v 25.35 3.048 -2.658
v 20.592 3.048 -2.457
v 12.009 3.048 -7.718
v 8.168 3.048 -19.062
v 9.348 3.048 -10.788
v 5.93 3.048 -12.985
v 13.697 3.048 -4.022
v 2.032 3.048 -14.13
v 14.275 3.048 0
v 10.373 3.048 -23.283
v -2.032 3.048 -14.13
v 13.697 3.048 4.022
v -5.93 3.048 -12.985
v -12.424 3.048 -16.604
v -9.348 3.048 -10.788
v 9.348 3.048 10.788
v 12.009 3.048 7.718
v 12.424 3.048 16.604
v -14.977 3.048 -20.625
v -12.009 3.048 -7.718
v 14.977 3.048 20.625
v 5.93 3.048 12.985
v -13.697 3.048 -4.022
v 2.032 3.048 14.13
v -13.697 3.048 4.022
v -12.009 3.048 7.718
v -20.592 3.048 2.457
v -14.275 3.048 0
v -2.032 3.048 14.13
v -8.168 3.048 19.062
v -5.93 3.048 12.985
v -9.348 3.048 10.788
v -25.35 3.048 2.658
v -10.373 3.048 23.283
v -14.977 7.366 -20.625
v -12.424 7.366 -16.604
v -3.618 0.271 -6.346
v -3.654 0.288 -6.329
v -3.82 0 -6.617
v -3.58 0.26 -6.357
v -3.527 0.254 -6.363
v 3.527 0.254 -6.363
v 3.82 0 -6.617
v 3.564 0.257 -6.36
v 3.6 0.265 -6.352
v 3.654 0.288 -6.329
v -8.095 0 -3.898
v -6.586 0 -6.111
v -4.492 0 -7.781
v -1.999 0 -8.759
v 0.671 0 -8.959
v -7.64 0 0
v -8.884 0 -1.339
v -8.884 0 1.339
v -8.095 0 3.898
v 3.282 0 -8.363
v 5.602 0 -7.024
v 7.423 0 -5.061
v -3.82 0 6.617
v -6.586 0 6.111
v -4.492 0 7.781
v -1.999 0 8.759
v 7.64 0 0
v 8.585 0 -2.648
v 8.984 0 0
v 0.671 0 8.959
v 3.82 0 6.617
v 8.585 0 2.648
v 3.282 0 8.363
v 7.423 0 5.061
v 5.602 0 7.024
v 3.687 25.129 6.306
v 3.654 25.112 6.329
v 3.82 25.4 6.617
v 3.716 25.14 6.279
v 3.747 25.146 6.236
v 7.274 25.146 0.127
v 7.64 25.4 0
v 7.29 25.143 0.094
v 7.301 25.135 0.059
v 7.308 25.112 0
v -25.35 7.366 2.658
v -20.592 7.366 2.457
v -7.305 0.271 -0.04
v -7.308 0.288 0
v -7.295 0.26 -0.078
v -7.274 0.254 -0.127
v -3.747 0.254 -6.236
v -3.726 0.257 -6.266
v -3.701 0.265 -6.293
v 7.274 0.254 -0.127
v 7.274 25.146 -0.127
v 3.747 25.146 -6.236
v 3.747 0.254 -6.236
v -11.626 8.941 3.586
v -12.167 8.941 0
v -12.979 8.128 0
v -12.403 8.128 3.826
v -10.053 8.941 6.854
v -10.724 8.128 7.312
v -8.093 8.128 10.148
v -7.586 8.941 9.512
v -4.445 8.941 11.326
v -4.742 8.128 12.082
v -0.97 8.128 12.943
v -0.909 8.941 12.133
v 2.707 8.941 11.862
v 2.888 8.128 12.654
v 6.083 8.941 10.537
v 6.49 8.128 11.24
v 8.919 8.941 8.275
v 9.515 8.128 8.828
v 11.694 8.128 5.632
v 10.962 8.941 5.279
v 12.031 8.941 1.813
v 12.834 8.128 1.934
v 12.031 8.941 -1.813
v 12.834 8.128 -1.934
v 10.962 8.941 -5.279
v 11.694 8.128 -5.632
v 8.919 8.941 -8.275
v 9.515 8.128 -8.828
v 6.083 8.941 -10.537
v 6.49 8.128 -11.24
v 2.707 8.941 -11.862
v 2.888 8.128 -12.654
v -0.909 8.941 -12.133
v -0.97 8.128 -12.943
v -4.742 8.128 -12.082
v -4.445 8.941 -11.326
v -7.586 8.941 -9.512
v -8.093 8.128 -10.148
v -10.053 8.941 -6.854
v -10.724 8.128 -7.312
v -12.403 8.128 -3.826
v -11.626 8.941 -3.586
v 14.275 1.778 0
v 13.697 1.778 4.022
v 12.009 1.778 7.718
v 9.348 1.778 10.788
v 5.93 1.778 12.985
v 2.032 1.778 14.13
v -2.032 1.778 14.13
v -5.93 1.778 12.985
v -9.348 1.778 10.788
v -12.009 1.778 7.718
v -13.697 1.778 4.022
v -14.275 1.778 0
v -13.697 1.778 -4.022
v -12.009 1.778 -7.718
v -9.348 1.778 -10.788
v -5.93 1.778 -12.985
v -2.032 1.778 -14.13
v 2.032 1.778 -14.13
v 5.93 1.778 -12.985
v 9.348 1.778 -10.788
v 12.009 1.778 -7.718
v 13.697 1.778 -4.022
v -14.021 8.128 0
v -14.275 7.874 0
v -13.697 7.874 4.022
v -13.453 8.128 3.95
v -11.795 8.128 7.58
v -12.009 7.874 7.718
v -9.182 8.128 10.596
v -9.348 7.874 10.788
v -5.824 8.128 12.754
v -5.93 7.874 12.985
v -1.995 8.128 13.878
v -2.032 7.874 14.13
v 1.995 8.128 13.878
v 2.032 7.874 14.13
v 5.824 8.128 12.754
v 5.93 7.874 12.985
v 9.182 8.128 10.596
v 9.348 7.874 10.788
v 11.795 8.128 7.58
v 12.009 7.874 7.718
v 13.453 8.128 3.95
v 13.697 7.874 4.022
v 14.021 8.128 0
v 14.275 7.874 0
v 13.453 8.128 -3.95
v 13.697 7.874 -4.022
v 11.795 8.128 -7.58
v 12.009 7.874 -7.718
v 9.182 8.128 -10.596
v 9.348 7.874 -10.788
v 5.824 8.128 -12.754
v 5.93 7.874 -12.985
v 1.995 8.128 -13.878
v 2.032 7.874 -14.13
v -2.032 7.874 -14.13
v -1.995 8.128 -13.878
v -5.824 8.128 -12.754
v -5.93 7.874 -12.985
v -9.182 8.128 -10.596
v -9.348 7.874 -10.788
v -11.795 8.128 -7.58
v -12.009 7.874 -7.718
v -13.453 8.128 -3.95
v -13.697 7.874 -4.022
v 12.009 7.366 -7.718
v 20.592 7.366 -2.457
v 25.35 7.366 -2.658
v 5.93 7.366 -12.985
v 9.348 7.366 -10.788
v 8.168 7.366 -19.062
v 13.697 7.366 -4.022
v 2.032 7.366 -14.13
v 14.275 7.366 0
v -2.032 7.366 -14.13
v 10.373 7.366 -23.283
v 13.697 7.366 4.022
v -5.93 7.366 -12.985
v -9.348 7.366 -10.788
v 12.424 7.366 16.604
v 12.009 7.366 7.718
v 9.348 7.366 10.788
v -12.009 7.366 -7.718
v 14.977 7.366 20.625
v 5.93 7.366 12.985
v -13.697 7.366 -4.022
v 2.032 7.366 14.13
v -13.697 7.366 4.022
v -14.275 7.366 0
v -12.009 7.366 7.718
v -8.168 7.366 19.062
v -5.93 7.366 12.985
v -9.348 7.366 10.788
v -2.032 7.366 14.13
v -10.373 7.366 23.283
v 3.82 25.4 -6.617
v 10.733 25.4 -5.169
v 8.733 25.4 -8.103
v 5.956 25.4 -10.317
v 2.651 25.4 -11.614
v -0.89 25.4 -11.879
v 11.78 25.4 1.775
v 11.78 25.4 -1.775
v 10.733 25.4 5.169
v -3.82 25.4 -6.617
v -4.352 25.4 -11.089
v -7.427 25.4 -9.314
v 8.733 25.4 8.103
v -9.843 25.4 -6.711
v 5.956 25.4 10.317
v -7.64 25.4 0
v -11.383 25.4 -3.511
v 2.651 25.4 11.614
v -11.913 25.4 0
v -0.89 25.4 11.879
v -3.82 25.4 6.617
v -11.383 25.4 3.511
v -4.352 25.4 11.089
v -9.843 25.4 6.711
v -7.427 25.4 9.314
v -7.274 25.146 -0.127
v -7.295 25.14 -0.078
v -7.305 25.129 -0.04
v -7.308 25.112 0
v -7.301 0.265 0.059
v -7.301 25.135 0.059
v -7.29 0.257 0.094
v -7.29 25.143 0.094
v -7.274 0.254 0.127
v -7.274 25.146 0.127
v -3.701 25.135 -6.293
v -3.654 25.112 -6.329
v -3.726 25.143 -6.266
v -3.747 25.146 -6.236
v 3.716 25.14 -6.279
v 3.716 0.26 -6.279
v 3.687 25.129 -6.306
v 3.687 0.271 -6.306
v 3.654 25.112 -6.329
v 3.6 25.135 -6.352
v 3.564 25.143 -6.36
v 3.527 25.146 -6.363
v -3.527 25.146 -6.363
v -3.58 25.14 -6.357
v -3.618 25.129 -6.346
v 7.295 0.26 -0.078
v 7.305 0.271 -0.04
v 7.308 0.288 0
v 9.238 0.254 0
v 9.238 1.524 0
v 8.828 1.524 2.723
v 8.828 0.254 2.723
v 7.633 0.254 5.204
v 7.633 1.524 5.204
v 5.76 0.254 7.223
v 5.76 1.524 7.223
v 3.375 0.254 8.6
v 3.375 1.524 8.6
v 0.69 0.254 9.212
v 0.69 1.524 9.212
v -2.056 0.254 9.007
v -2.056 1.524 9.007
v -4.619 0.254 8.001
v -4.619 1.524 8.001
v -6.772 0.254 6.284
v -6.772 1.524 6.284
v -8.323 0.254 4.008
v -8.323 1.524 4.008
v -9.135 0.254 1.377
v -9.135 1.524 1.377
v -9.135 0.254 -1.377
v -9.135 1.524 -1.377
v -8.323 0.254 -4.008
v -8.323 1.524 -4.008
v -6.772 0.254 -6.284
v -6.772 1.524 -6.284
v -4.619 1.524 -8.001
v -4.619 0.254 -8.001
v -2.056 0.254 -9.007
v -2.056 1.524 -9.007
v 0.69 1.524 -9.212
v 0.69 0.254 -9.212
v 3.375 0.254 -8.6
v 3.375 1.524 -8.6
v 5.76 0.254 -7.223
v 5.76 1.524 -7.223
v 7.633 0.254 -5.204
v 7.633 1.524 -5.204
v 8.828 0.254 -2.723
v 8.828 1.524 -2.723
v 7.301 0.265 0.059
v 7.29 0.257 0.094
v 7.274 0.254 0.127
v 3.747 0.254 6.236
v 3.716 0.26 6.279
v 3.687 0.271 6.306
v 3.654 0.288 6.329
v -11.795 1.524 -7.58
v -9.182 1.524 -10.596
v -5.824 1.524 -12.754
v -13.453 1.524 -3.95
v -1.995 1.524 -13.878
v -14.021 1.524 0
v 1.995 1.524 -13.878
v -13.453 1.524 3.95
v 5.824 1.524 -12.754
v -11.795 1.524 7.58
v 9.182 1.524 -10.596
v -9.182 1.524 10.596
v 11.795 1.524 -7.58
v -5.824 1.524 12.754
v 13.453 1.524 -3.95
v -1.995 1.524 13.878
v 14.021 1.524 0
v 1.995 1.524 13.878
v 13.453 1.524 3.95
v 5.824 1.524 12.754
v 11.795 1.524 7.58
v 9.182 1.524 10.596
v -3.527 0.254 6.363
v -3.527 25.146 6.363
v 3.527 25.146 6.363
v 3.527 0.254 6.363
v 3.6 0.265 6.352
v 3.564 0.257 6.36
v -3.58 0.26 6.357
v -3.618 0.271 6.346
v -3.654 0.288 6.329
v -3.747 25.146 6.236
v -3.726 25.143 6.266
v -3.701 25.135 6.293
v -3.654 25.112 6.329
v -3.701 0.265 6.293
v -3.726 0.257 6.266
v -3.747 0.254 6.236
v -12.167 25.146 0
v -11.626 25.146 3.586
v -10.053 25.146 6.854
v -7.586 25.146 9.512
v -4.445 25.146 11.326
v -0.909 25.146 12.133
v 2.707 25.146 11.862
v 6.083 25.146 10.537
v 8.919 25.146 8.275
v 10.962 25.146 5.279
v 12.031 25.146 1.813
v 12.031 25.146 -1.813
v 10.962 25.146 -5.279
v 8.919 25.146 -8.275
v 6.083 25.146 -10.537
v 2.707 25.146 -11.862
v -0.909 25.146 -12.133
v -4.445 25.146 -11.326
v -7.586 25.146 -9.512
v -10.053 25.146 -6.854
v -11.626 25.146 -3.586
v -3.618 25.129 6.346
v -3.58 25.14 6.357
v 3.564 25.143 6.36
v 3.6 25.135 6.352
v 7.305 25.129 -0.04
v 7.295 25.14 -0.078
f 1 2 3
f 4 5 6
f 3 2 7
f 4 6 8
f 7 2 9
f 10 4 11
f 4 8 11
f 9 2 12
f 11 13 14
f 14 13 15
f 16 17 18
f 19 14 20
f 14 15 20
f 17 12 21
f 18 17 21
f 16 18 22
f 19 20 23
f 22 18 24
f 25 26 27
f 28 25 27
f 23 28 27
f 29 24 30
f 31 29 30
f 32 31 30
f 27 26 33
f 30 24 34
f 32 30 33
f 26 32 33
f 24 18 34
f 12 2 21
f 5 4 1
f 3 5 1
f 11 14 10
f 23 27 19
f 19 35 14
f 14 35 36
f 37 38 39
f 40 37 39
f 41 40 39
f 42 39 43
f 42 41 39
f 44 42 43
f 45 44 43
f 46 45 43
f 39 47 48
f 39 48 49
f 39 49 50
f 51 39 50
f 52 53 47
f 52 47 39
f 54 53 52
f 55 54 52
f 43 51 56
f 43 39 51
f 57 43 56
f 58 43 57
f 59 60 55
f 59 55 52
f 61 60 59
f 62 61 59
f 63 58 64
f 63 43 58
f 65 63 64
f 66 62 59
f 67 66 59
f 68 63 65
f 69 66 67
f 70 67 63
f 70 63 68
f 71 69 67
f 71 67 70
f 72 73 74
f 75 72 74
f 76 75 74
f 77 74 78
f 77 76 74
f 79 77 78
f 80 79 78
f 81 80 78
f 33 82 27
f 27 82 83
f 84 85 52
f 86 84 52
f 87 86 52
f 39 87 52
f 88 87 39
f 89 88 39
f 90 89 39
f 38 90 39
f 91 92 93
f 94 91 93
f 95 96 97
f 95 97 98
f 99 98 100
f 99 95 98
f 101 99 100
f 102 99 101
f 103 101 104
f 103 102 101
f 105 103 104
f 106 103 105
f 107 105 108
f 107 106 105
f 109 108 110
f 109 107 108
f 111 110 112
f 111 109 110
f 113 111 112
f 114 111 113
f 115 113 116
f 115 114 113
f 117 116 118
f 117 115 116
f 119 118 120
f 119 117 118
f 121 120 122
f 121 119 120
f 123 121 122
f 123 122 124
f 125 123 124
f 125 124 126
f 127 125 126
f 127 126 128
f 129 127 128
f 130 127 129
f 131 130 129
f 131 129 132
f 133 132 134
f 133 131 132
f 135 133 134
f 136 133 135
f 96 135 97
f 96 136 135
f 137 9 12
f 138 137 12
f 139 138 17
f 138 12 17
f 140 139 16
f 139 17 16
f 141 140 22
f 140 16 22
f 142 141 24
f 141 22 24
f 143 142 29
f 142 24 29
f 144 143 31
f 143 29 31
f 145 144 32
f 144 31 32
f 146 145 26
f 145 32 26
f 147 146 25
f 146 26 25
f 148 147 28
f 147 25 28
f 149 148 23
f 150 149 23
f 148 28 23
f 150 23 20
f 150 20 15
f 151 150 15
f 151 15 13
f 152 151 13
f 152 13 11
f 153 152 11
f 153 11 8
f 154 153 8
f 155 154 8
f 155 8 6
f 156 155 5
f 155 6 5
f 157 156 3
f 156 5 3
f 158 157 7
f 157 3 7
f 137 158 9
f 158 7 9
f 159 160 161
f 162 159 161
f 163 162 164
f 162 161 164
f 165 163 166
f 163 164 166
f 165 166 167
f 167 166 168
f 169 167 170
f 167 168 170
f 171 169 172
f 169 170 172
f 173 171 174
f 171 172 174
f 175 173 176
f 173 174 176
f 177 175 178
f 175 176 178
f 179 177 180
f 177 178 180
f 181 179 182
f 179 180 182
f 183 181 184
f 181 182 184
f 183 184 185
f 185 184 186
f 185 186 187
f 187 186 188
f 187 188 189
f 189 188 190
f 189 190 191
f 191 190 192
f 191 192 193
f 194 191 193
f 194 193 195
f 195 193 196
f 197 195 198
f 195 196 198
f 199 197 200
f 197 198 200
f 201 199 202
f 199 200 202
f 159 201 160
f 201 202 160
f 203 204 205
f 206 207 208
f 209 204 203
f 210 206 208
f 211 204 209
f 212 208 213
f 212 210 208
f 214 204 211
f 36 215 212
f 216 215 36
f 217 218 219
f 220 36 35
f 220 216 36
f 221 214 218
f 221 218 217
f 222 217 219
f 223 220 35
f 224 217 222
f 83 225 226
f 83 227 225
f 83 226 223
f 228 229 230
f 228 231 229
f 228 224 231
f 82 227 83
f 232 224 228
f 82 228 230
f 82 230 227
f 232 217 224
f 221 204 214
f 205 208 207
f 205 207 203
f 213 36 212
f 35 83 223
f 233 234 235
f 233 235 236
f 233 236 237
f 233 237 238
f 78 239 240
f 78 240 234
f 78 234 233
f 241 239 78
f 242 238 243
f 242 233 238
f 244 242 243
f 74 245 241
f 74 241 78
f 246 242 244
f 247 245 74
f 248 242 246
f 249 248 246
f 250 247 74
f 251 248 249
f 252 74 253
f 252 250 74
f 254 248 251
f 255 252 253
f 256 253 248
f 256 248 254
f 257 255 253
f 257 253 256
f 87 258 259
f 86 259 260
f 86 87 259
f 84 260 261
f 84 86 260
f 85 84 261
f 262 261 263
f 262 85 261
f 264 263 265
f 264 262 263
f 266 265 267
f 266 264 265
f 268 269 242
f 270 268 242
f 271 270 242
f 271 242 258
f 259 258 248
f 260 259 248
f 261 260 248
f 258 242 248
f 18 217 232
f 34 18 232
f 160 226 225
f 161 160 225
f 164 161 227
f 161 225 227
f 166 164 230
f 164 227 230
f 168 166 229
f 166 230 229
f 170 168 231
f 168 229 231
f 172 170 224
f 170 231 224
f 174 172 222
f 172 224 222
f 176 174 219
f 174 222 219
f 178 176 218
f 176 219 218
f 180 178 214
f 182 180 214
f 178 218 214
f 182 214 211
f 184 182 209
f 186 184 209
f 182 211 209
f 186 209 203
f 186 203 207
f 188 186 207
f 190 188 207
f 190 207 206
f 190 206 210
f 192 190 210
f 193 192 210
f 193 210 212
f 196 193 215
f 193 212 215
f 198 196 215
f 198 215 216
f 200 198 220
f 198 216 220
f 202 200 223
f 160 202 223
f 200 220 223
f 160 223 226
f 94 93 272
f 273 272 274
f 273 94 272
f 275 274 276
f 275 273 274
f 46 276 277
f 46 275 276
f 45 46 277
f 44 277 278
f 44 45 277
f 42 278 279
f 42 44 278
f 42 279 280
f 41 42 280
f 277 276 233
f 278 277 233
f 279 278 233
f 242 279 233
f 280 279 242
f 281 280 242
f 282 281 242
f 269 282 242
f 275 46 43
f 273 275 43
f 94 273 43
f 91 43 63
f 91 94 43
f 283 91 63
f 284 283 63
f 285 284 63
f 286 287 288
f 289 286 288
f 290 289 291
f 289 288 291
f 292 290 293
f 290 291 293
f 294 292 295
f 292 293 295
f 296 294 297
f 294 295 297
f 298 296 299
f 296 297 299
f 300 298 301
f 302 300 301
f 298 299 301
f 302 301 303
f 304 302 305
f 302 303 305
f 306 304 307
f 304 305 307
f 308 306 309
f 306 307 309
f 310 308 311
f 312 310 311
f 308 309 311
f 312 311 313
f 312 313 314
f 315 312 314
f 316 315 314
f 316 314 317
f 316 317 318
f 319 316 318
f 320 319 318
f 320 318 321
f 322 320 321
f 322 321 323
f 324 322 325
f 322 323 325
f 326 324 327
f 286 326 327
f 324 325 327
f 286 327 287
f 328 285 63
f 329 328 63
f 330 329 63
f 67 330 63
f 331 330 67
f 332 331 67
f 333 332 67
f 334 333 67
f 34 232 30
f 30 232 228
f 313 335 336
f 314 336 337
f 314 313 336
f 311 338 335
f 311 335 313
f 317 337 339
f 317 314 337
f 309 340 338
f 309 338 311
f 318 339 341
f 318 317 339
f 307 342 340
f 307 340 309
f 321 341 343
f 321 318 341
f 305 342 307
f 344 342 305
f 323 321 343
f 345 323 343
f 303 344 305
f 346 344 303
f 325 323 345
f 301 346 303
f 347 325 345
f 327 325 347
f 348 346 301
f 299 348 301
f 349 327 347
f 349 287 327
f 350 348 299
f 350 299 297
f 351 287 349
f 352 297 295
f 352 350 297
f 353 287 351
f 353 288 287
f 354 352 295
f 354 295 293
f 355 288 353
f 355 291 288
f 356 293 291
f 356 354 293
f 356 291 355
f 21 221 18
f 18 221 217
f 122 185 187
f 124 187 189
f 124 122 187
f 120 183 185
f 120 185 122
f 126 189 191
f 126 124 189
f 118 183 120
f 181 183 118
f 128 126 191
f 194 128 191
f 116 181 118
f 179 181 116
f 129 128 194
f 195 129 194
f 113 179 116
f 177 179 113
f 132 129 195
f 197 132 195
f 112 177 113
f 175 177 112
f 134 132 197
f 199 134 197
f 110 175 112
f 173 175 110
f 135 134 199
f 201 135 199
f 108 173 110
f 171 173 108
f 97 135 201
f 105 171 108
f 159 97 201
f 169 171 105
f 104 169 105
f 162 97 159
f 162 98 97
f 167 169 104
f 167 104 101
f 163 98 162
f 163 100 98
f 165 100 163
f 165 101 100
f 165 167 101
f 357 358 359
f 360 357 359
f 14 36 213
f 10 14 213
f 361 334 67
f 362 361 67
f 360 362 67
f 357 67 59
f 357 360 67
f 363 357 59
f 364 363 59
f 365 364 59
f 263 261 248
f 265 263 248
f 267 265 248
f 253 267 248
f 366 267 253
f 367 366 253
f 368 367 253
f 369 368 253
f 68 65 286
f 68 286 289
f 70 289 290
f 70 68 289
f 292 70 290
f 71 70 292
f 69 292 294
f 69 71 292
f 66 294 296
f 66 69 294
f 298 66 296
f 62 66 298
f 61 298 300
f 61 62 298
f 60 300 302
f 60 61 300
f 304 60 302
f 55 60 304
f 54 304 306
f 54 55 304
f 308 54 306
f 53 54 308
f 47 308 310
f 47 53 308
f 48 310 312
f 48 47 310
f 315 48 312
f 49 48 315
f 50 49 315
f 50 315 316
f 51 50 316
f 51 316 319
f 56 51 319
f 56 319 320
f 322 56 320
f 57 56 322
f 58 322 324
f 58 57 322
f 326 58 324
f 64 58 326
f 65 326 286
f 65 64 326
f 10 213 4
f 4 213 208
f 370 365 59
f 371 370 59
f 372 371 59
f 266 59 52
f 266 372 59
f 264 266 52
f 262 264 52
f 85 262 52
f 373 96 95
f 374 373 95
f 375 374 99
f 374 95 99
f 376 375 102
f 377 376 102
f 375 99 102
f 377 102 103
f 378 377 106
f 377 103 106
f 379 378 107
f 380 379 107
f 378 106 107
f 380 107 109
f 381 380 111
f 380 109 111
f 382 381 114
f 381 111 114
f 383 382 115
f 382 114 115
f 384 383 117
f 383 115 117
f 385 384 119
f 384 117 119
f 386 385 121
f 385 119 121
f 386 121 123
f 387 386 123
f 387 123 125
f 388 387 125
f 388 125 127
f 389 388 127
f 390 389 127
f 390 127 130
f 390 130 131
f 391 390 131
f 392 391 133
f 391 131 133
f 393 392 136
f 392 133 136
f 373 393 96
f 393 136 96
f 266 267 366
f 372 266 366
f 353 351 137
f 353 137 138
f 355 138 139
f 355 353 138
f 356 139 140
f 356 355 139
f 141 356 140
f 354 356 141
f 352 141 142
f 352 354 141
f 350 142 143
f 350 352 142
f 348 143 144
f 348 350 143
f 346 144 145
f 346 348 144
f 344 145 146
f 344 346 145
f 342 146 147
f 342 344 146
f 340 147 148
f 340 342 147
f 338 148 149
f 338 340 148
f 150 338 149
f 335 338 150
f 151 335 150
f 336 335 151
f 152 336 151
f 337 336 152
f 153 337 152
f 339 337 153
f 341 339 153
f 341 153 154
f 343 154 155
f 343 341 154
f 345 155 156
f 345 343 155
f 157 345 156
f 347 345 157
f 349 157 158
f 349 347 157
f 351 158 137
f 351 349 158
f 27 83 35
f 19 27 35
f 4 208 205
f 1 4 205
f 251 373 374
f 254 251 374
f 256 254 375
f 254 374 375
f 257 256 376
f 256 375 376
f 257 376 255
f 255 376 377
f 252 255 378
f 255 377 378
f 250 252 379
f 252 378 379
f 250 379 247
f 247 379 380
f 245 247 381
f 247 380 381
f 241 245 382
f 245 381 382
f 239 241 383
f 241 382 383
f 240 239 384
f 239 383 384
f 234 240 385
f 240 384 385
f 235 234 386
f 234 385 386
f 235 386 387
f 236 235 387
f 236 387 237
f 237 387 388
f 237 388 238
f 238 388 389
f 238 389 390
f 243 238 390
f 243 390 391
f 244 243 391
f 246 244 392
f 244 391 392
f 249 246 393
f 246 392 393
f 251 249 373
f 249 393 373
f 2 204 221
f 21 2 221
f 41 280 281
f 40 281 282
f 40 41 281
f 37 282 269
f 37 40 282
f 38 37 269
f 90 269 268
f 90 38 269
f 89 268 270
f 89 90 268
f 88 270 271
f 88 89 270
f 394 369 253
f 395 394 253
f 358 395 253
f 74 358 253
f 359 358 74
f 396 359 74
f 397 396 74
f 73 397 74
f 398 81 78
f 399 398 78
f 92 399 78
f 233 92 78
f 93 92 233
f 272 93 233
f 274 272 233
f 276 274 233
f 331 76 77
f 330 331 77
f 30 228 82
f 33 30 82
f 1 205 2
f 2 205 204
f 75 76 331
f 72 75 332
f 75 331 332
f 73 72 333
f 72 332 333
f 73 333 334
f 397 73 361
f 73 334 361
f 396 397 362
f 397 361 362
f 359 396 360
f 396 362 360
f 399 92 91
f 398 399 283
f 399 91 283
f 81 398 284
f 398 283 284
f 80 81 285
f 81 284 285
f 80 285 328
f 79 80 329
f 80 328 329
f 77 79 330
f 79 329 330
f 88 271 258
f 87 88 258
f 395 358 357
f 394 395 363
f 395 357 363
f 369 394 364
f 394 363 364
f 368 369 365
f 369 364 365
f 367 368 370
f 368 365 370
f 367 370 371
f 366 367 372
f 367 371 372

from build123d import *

# Parameters (mm, degrees)
SKETCH1_W           = 27.7876
SKETCH1_H           = 4.318
CUT_EXTRUDE1_DEPTH  = 5.318
CUT_EXTRUDE2_DEPTH  = 5.318
CUT_EXTRUDE3_DEPTH  = 5.318
CUT_EXTRUDE4_DEPTH  = 5.318
CUT_EXTRUDE5_DEPTH  = 5.318
CUT_EXTRUDE6_DEPTH  = 5.318
CUT_EXTRUDE7_DEPTH  = 5.318
CUT_EXTRUDE8_DEPTH  = 5.318
CUT_EXTRUDE9_DEPTH  = 5.318
CUT_EXTRUDE10_DEPTH = 5.318
CUT_EXTRUDE11_DEPTH = 5.318
CUT_EXTRUDE12_DEPTH = 5.318
SKETCH14_R          = 14.2748
BOSS_EXTRUDE1_DEPTH = 1.524
SKETCH15_R          = 9.23823544
BOSS_EXTRUDE2_DEPTH = 1.524
SKETCH16_R          = 14.2748
BOSS_EXTRUDE3_DEPTH = 0.762
SKETCH17_R          = 12.1666
BOSS_EXTRUDE4_DEPTH = 17.272
CUT_EXTRUDE13_DEPTH = 26.4
SKETCH19_W          = 2.5908
SKETCH19_H          = 4.318
SKETCH20_W          = 2.5908
SKETCH20_H          = 4.318
SKETCH21_W          = 2.5908
SKETCH21_H          = 4.318
SKETCH22_W          = 2.5908
SKETCH22_H          = 4.318
SKETCH23_W          = 2.5908
SKETCH23_H          = 4.318
SKETCH24_W          = 2.5908
SKETCH24_H          = 4.318
CHAMFER1_SIZE       = 0.254
CHAMFER2_SIZE       = 0.8128
FILLET1_R           = 0.254
FILLET2_R           = 0.7874
FILLET3_R           = 1.27
SKETCH25_R          = 28.050561638
SKETCH25_R_2        = 25.4889
CUT_EXTRUDE14_DEPTH = 8.366
CUT_EXTRUDE15_DEPTH = 8.366


with BuildPart() as part:
    # Sketch1 → Revolve1 (revolve)
    with BuildSketch(Plane.XY):
        with Locations((13.8938, 5.207)):
            Rectangle(SKETCH1_W, SKETCH1_H)
    revolve(axis=Axis((0, 7.366, 0), (0, -1, 0)))

    # Sketch2 → Cut-Extrude1 (cut, through all)
    with BuildSketch(Plane(origin=(0, 7.366, 0), x_dir=(-1, 0, 0), z_dir=(0, 1, 0))):
        with BuildLine():
            Line((27.742216161, 1.5875), (25.859959008, 1.5875))
            ThreePointArc((25.859959008, 1.5875), (26.4033, 0), (25.859959008, -1.5875))
            Line((25.859959008, -1.5875), (27.742216161, -1.5875))
            ThreePointArc((27.742216161, -1.5875), (27.7876, 0), (27.742216161, 1.5875))
        make_face()
    extrude(amount=-CUT_EXTRUDE1_DEPTH, mode=Mode.SUBTRACT)

    # Sketch3 → Cut-Extrude2 (cut, through all)
    with BuildSketch(Plane(origin=(0, 7.366, 0), x_dir=(-1, 0, 0), z_dir=(0, 1, 0))):
        with BuildLine():
            ThreePointArc((27.521980347, -3.832924674), (26.332306318, -4.701290474), (24.95050128, -5.211190755))
            ThreePointArc((24.95050128, -5.211190755), (22.074034915, -12.74445), (16.988274218, -19.002172568))
            ThreePointArc((16.988274218, -19.002172568), (17.23759014, -20.453800974), (17.080400312, -21.918271806))
            ThreePointArc((17.080400312, -21.918271806), (24.06476751, -13.8938), (27.521980347, -3.832924674))
        make_face()
    extrude(amount=-CUT_EXTRUDE2_DEPTH, mode=Mode.SUBTRACT)

    # Sketch4 → Cut-Extrude3 (cut, through all)
    with BuildSketch(Plane(origin=(0, 7.366, 0), x_dir=(-1, 0, 0), z_dir=(0, 1, 0))):
        with BuildLine():
            Line((15.245923409, -23.231713952), (14.304794833, -21.601631442))
            ThreePointArc((14.304794833, -21.601631442), (13.20165, -22.865928544), (11.555164176, -23.189131442))
            Line((11.555164176, -23.189131442), (12.496292752, -24.819213952))
            ThreePointArc((12.496292752, -24.819213952), (13.8938, -24.06476751), (15.245923409, -23.231713952))
        make_face()
    extrude(amount=-CUT_EXTRUDE3_DEPTH, mode=Mode.SUBTRACT)

    # Sketch5 → Cut-Extrude4 (cut, through all)
    with BuildSketch(Plane(origin=(0, 7.366, 0), x_dir=(-1, 0, 0), z_dir=(0, 1, 0))):
        with BuildLine():
            ThreePointArc((10.441580035, -25.75119648), (9.094716178, -25.155091448), (7.962227062, -24.213363323))
            ThreePointArc((7.962227062, -24.213363323), (0, -25.4889), (-7.962227062, -24.213363323))
            ThreePointArc((-7.962227062, -24.213363323), (-9.094716178, -25.155091448), (-10.441580035, -25.75119648))
            ThreePointArc((-10.441580035, -25.75119648), (0, -27.7876), (10.441580035, -25.75119648))
        make_face()
    extrude(amount=-CUT_EXTRUDE4_DEPTH, mode=Mode.SUBTRACT)

    # Sketch6 → Cut-Extrude5 (cut, through all)
    with BuildSketch(Plane(origin=(0, 7.366, 0), x_dir=(-1, 0, 0), z_dir=(0, 1, 0))):
        with BuildLine():
            Line((-12.496292752, -24.819213952), (-11.555164176, -23.189131442))
            ThreePointArc((-11.555164176, -23.189131442), (-13.20165, -22.865928544), (-14.304794833, -21.601631442))
            Line((-14.304794833, -21.601631442), (-15.245923409, -23.231713952))
            ThreePointArc((-15.245923409, -23.231713952), (-13.8938, -24.06476751), (-12.496292752, -24.819213952))
        make_face()
    extrude(amount=-CUT_EXTRUDE5_DEPTH, mode=Mode.SUBTRACT)

    # Sketch7 → Cut-Extrude6 (cut, through all)
    with BuildSketch(Plane(origin=(0, 7.366, 0), x_dir=(-1, 0, 0), z_dir=(0, 1, 0))):
        with BuildLine():
            ThreePointArc((-17.080400312, -21.918271806), (-17.23759014, -20.453800974), (-16.988274218, -19.002172568))
            ThreePointArc((-16.988274218, -19.002172568), (-22.074034915, -12.74445), (-24.95050128, -5.211190755))
            ThreePointArc((-24.95050128, -5.211190755), (-26.332306318, -4.701290474), (-27.521980347, -3.832924674))
            ThreePointArc((-27.521980347, -3.832924674), (-24.06476751, -13.8938), (-17.080400312, -21.918271806))
        make_face()
    extrude(amount=-CUT_EXTRUDE6_DEPTH, mode=Mode.SUBTRACT)

    # Sketch8 → Cut-Extrude7 (cut, through all)
    with BuildSketch(Plane(origin=(0, 7.366, 0), x_dir=(-1, 0, 0), z_dir=(0, 1, 0))):
        with BuildLine():
            Line((-27.742216161, -1.5875), (-25.859959008, -1.5875))
            ThreePointArc((-25.859959008, -1.5875), (-26.4033, 0), (-25.859959008, 1.5875))
            Line((-25.859959008, 1.5875), (-27.742216161, 1.5875))
            ThreePointArc((-27.742216161, 1.5875), (-27.7876, 0), (-27.742216161, -1.5875))
        make_face()
    extrude(amount=-CUT_EXTRUDE7_DEPTH, mode=Mode.SUBTRACT)

    # Sketch9 → Cut-Extrude8 (cut, through all)
    with BuildSketch(Plane(origin=(0, 7.366, 0), x_dir=(-1, 0, 0), z_dir=(0, 1, 0))):
        with BuildLine():
            ThreePointArc((-27.521980347, 3.832924674), (-26.332306318, 4.701290474), (-24.95050128, 5.211190755))
            ThreePointArc((-24.95050128, 5.211190755), (-22.074034915, 12.74445), (-16.988274218, 19.002172568))
            ThreePointArc((-16.988274218, 19.002172568), (-17.23759014, 20.453800974), (-17.080400312, 21.918271806))
            ThreePointArc((-17.080400312, 21.918271806), (-24.06476751, 13.8938), (-27.521980347, 3.832924674))
        make_face()
    extrude(amount=-CUT_EXTRUDE8_DEPTH, mode=Mode.SUBTRACT)

    # Sketch10 → Cut-Extrude9 (cut, through all)
    with BuildSketch(Plane(origin=(0, 7.366, 0), x_dir=(-1, 0, 0), z_dir=(0, 1, 0))):
        with BuildLine():
            Line((-15.245923409, 23.231713952), (-14.304794833, 21.601631442))
            ThreePointArc((-14.304794833, 21.601631442), (-13.20165, 22.865928544), (-11.555164176, 23.189131442))
            Line((-11.555164176, 23.189131442), (-12.496292752, 24.819213952))
            ThreePointArc((-12.496292752, 24.819213952), (-13.8938, 24.06476751), (-15.245923409, 23.231713952))
        make_face()
    extrude(amount=-CUT_EXTRUDE9_DEPTH, mode=Mode.SUBTRACT)

    # Sketch11 → Cut-Extrude10 (cut, through all)
    with BuildSketch(Plane(origin=(0, 7.366, 0), x_dir=(-1, 0, 0), z_dir=(0, 1, 0))):
        with BuildLine():
            ThreePointArc((-10.441580035, 25.75119648), (-9.094716178, 25.155091448), (-7.962227062, 24.213363323))
            ThreePointArc((-7.962227062, 24.213363323), (0, 25.4889), (7.962227062, 24.213363323))
            ThreePointArc((7.962227062, 24.213363323), (9.094716178, 25.155091448), (10.441580035, 25.75119648))
            ThreePointArc((10.441580035, 25.75119648), (0, 27.7876), (-10.441580035, 25.75119648))
        make_face()
    extrude(amount=-CUT_EXTRUDE10_DEPTH, mode=Mode.SUBTRACT)

    # Sketch12 → Cut-Extrude11 (cut, through all)
    with BuildSketch(Plane(origin=(0, 7.366, 0), x_dir=(-1, 0, 0), z_dir=(0, 1, 0))):
        with BuildLine():
            Line((12.496292752, 24.819213952), (11.555164176, 23.189131442))
            ThreePointArc((11.555164176, 23.189131442), (13.20165, 22.865928544), (14.304794833, 21.601631442))
            Line((14.304794833, 21.601631442), (15.245923409, 23.231713952))
            ThreePointArc((15.245923409, 23.231713952), (13.8938, 24.06476751), (12.496292752, 24.819213952))
        make_face()
    extrude(amount=-CUT_EXTRUDE11_DEPTH, mode=Mode.SUBTRACT)

    # Sketch13 → Cut-Extrude12 (cut, through all)
    with BuildSketch(Plane(origin=(0, 7.366, 0), x_dir=(-1, 0, 0), z_dir=(0, 1, 0))):
        with BuildLine():
            ThreePointArc((17.080400312, 21.918271806), (17.23759014, 20.453800974), (16.988274218, 19.002172568))
            ThreePointArc((16.988274218, 19.002172568), (22.074034915, 12.74445), (24.95050128, 5.211190755))
            ThreePointArc((24.95050128, 5.211190755), (26.332306318, 4.701290474), (27.521980347, 3.832924674))
            ThreePointArc((27.521980347, 3.832924674), (24.06476751, 13.8938), (17.080400312, 21.918271806))
        make_face()
    extrude(amount=-CUT_EXTRUDE12_DEPTH, mode=Mode.SUBTRACT)

    # Sketch14 → Boss-Extrude1 (add)
    with BuildSketch(Plane.XZ.offset(-3.048)):
        Circle(SKETCH14_R)
    extrude(amount=BOSS_EXTRUDE1_DEPTH)

    # Sketch15 → Boss-Extrude2 (add)
    with BuildSketch(Plane.XZ.offset(-1.524)):
        Circle(SKETCH15_R)
    extrude(amount=BOSS_EXTRUDE2_DEPTH)

    # Sketch16 → Boss-Extrude3 (add)
    with BuildSketch(Plane(origin=(0, 7.366, 0), x_dir=(-1, 0, 0), z_dir=(0, 1, 0))):
        Circle(SKETCH16_R)
    extrude(amount=BOSS_EXTRUDE3_DEPTH)

    # Sketch17 → Boss-Extrude4 (add)
    with BuildSketch(Plane(origin=(0, 8.128, 0), x_dir=(-1, 0, 0), z_dir=(0, 1, 0))):
        Circle(SKETCH17_R)
    extrude(amount=BOSS_EXTRUDE4_DEPTH)

    # Sketch18 → Cut-Extrude13 (cut, through all)
    with BuildSketch(Plane(origin=(0, 25.4, 0), x_dir=(-1, 0, 0), z_dir=(0, 1, 0))):
        Polygon((-3.673506558, -6.3627), (3.673506558, -6.3627), (7.347013116, 0), (3.673506558, 6.3627), (-3.673506558, 6.3627), (-7.347013116, 0), align=None)
    extrude(amount=-CUT_EXTRUDE13_DEPTH, mode=Mode.SUBTRACT)

    # Sketch19 → Cut-Revolve1 (revolve, cut)
    with BuildSketch(Plane(origin=(0, 0, 0), x_dir=(-1, 0, 0), z_dir=(0, 0, -1))):
        with Locations((22.5171, 5.207)):
            Rectangle(SKETCH19_W, SKETCH19_H)
    revolve(axis=Axis((-23.8125, 3.048, 0), (0, 1, 0)), mode=Mode.SUBTRACT)

    # Sketch20 → Cut-Revolve2 (revolve, cut)
    with BuildSketch(Plane(origin=(0, 0, -20.622229928), x_dir=(-1, 0, 0), z_dir=(0, 0, -1))):
        with Locations((10.61085, 5.207)):
            Rectangle(SKETCH20_W, SKETCH20_H)
    revolve(axis=Axis((-11.90625, 3.048, -20.622229928), (0, 1, 0)), mode=Mode.SUBTRACT)

    # Sketch21 → Cut-Revolve3 (revolve, cut)
    with BuildSketch(Plane(origin=(0, 0, -20.622229928), x_dir=(-1, 0, 0), z_dir=(0, 0, -1))):
        with Locations((-13.20165, 5.207)):
            Rectangle(SKETCH21_W, SKETCH21_H)
    revolve(axis=Axis((11.90625, 3.048, -20.622229928), (0, 1, 0)), mode=Mode.SUBTRACT)

    # Sketch22 → Cut-Revolve4 (revolve, cut)
    with BuildSketch(Plane(origin=(0, 0, 0), x_dir=(-1, 0, 0), z_dir=(0, 0, -1))):
        with Locations((-25.1079, 5.207)):
            Rectangle(SKETCH22_W, SKETCH22_H)
    revolve(axis=Axis((23.8125, 3.048, 0), (0, 1, 0)), mode=Mode.SUBTRACT)

    # Sketch23 → Cut-Revolve5 (revolve, cut)
    with BuildSketch(Plane(origin=(0, 0, 20.622229928), x_dir=(-1, 0, 0), z_dir=(0, 0, -1))):
        with Locations((-13.20165, 5.207)):
            Rectangle(SKETCH23_W, SKETCH23_H)
    revolve(axis=Axis((11.90625, 3.048, 20.622229928), (0, 1, 0)), mode=Mode.SUBTRACT)

    # Sketch24 → Cut-Revolve6 (revolve, cut)
    with BuildSketch(Plane(origin=(0, 0, 20.622229928), x_dir=(-1, 0, 0), z_dir=(0, 0, -1))):
        with Locations((10.61085, 5.207)):
            Rectangle(SKETCH24_W, SKETCH24_H)
    revolve(axis=Axis((-11.90625, 3.048, 20.622229928), (0, 1, 0)), mode=Mode.SUBTRACT)

    # Chamfer1
    chamfer1_edges = [part.edges().sort_by_distance(p)[0] for p in [
        (-14.2748, 1.524, 0),
        (-9.23823544, 0, 0),
        (14.2748, 8.128, 0),
        (12.1666, 25.4, 0),
        (5.510259837, 0, -3.18135),
        (5.510259837, 0, 3.18135),
        (0, 0, 6.3627),
        (-5.510259837, 0, 3.18135),
        (-5.510259837, 0, -3.18135),
        (0, 0, -6.3627),
        (5.510259837, 25.4, -3.18135),
        (0, 25.4, -6.3627),
        (-5.510259837, 25.4, -3.18135),
        (-5.510259837, 25.4, 3.18135),
        (0, 25.4, 6.3627),
        (5.510259837, 25.4, 3.18135),
    ]]
    chamfer(chamfer1_edges, length=CHAMFER1_SIZE)

    # Chamfer2
    chamfer2_edges = [part.edges().sort_by_distance(p)[0] for p in [
        (12.1666, 8.128, 0),
    ]]
    chamfer(chamfer2_edges, length=CHAMFER2_SIZE)

    # Fillet1
    fillet1_edges = [part.edges().sort_by_distance(p)[0] for p in [
        (3.673506558, 12.7, -6.3627),
        (7.347013116, 12.7, 0),
        (-3.673506558, 12.7, -6.3627),
        (-7.347013116, 12.7, 0),
        (-3.673506558, 12.7, 6.3627),
        (3.673506558, 12.7, 6.3627),
    ]]
    fillet(fillet1_edges, radius=FILLET1_R)

    # Fillet2
    fillet2_edges = [part.edges().sort_by_distance(p)[0] for p in [
        (27.742216161, 5.207, -1.5875),
        (27.742216161, 5.207, 1.5875),
        (25.859959008, 5.207, 1.5875),
        (25.859959008, 5.207, -1.5875),
        (-27.742216161, 5.207, 1.5875),
        (-27.742216161, 5.207, -1.5875),
        (-25.859959008, 5.207, -1.5875),
        (-25.859959008, 5.207, 1.5875),
        (15.245923409, 5.207, 23.231713952),
        (12.496292752, 5.207, 24.819213952),
        (11.555164176, 5.207, 23.189131442),
        (14.304794833, 5.207, 21.601631442),
        (-12.496292752, 5.207, 24.819213952),
        (-15.245923409, 5.207, 23.231713952),
        (-14.304794833, 5.207, 21.601631442),
        (-11.555164176, 5.207, 23.189131442),
        (-15.245923409, 5.207, -23.231713952),
        (-12.496292752, 5.207, -24.819213952),
        (-11.555164176, 5.207, -23.189131442),
        (-14.304794833, 5.207, -21.601631442),
        (12.496292752, 5.207, -24.819213952),
        (15.245923409, 5.207, -23.231713952),
        (14.304794833, 5.207, -21.601631442),
        (11.555164176, 5.207, -23.189131442),
    ]]
    fillet(fillet2_edges, radius=FILLET2_R)

    # Fillet3
    fillet3_edges = [part.edges().sort_by_distance(p)[0] for p in [
        (27.521980347, 5.207, 3.832924674),
        (17.080400312, 5.207, 21.918271806),
        (16.988274218, 5.207, 19.002172568),
        (24.95050128, 5.207, 5.211190755),
        (10.441580035, 5.207, 25.75119648),
        (-10.441580035, 5.207, 25.75119648),
        (-7.962227062, 5.207, 24.213363323),
        (7.962227062, 5.207, 24.213363323),
        (-17.080400312, 5.207, 21.918271806),
        (-27.521980347, 5.207, 3.832924674),
        (-24.95050128, 5.207, 5.211190755),
        (-16.988274218, 5.207, 19.002172568),
        (-27.521980347, 5.207, -3.832924674),
        (-17.080400312, 5.207, -21.918271806),
        (-16.988274218, 5.207, -19.002172568),
        (-24.95050128, 5.207, -5.211190755),
        (-10.441580035, 5.207, -25.75119648),
        (10.441580035, 5.207, -25.75119648),
        (7.962227062, 5.207, -24.213363323),
        (-7.962227062, 5.207, -24.213363323),
        (17.080400312, 5.207, -21.918271806),
        (27.521980347, 5.207, -3.832924674),
        (24.95050128, 5.207, -5.211190755),
        (16.988274218, 5.207, -19.002172568),
    ]]
    fillet(fillet3_edges, radius=FILLET3_R)

    # Sketch25 → Cut-Extrude14 (cut, through all)
    with BuildSketch(Plane(origin=(0, 7.366, 0), x_dir=(1, 0, 0), z_dir=(0, 1, 0))):
        Circle(SKETCH25_R)
        Circle(SKETCH25_R_2, mode=Mode.SUBTRACT)
    extrude(amount=-CUT_EXTRUDE14_DEPTH, mode=Mode.SUBTRACT)

    # Sketch26 → Cut-Extrude15 (cut, through all)
    with BuildSketch(Plane(origin=(0, 7.366, 0), x_dir=(1, 0, 0), z_dir=(0, 1, 0))):
        with BuildLine():
            Line((-14.976810881, 20.624722035), (-12.423898781, 16.604268571))
            Line((-12.423898781, 16.604268571), (10.373127788, 23.282659708))
            ThreePointArc((10.373127788, 23.282659708), (-2.657937673, 25.349938669), (-14.976810881, 20.624722035))
        make_face()
        with BuildLine():
            Line((-20.591667784, -2.457277673), (-14.976810881, 20.624722035))
            ThreePointArc((-14.976810881, 20.624722035), (-23.282659708, 10.373127788), (-25.349938669, -2.657937673))
            Line((-25.349938669, -2.657937673), (-20.591667784, -2.457277673))
        make_face()
        with BuildLine():
            ThreePointArc((25.349938669, 2.657937673), (20.624722035, 14.976810881), (10.373127788, 23.282659708))
            Line((10.373127788, 23.282659708), (8.167769003, 19.061546244))
            Line((8.167769003, 19.061546244), (25.349938669, 2.657937673))
        make_face()
        with BuildLine():
            Line((-8.167769003, -19.061546244), (-25.349938669, -2.657937673))
            ThreePointArc((-25.349938669, -2.657937673), (-20.624722035, -14.976810881), (-10.373127788, -23.282659708))
            Line((-10.373127788, -23.282659708), (-8.167769003, -19.061546244))
        make_face()
        with BuildLine():
            ThreePointArc((14.976810881, -20.624722035), (23.282659708, -10.373127788), (25.349938669, 2.657937673))
            Line((25.349938669, 2.657937673), (20.591667784, 2.457277673))
            Line((20.591667784, 2.457277673), (14.976810881, -20.624722035))
        make_face()
        with BuildLine():
            Line((12.423898781, -16.604268571), (-10.373127788, -23.282659708))
            ThreePointArc((-10.373127788, -23.282659708), (2.657937673, -25.349938669), (14.976810881, -20.624722035))
            Line((14.976810881, -20.624722035), (12.423898781, -16.604268571))
        make_face()
    extrude(amount=-CUT_EXTRUDE15_DEPTH, mode=Mode.SUBTRACT)


solid = part.part
